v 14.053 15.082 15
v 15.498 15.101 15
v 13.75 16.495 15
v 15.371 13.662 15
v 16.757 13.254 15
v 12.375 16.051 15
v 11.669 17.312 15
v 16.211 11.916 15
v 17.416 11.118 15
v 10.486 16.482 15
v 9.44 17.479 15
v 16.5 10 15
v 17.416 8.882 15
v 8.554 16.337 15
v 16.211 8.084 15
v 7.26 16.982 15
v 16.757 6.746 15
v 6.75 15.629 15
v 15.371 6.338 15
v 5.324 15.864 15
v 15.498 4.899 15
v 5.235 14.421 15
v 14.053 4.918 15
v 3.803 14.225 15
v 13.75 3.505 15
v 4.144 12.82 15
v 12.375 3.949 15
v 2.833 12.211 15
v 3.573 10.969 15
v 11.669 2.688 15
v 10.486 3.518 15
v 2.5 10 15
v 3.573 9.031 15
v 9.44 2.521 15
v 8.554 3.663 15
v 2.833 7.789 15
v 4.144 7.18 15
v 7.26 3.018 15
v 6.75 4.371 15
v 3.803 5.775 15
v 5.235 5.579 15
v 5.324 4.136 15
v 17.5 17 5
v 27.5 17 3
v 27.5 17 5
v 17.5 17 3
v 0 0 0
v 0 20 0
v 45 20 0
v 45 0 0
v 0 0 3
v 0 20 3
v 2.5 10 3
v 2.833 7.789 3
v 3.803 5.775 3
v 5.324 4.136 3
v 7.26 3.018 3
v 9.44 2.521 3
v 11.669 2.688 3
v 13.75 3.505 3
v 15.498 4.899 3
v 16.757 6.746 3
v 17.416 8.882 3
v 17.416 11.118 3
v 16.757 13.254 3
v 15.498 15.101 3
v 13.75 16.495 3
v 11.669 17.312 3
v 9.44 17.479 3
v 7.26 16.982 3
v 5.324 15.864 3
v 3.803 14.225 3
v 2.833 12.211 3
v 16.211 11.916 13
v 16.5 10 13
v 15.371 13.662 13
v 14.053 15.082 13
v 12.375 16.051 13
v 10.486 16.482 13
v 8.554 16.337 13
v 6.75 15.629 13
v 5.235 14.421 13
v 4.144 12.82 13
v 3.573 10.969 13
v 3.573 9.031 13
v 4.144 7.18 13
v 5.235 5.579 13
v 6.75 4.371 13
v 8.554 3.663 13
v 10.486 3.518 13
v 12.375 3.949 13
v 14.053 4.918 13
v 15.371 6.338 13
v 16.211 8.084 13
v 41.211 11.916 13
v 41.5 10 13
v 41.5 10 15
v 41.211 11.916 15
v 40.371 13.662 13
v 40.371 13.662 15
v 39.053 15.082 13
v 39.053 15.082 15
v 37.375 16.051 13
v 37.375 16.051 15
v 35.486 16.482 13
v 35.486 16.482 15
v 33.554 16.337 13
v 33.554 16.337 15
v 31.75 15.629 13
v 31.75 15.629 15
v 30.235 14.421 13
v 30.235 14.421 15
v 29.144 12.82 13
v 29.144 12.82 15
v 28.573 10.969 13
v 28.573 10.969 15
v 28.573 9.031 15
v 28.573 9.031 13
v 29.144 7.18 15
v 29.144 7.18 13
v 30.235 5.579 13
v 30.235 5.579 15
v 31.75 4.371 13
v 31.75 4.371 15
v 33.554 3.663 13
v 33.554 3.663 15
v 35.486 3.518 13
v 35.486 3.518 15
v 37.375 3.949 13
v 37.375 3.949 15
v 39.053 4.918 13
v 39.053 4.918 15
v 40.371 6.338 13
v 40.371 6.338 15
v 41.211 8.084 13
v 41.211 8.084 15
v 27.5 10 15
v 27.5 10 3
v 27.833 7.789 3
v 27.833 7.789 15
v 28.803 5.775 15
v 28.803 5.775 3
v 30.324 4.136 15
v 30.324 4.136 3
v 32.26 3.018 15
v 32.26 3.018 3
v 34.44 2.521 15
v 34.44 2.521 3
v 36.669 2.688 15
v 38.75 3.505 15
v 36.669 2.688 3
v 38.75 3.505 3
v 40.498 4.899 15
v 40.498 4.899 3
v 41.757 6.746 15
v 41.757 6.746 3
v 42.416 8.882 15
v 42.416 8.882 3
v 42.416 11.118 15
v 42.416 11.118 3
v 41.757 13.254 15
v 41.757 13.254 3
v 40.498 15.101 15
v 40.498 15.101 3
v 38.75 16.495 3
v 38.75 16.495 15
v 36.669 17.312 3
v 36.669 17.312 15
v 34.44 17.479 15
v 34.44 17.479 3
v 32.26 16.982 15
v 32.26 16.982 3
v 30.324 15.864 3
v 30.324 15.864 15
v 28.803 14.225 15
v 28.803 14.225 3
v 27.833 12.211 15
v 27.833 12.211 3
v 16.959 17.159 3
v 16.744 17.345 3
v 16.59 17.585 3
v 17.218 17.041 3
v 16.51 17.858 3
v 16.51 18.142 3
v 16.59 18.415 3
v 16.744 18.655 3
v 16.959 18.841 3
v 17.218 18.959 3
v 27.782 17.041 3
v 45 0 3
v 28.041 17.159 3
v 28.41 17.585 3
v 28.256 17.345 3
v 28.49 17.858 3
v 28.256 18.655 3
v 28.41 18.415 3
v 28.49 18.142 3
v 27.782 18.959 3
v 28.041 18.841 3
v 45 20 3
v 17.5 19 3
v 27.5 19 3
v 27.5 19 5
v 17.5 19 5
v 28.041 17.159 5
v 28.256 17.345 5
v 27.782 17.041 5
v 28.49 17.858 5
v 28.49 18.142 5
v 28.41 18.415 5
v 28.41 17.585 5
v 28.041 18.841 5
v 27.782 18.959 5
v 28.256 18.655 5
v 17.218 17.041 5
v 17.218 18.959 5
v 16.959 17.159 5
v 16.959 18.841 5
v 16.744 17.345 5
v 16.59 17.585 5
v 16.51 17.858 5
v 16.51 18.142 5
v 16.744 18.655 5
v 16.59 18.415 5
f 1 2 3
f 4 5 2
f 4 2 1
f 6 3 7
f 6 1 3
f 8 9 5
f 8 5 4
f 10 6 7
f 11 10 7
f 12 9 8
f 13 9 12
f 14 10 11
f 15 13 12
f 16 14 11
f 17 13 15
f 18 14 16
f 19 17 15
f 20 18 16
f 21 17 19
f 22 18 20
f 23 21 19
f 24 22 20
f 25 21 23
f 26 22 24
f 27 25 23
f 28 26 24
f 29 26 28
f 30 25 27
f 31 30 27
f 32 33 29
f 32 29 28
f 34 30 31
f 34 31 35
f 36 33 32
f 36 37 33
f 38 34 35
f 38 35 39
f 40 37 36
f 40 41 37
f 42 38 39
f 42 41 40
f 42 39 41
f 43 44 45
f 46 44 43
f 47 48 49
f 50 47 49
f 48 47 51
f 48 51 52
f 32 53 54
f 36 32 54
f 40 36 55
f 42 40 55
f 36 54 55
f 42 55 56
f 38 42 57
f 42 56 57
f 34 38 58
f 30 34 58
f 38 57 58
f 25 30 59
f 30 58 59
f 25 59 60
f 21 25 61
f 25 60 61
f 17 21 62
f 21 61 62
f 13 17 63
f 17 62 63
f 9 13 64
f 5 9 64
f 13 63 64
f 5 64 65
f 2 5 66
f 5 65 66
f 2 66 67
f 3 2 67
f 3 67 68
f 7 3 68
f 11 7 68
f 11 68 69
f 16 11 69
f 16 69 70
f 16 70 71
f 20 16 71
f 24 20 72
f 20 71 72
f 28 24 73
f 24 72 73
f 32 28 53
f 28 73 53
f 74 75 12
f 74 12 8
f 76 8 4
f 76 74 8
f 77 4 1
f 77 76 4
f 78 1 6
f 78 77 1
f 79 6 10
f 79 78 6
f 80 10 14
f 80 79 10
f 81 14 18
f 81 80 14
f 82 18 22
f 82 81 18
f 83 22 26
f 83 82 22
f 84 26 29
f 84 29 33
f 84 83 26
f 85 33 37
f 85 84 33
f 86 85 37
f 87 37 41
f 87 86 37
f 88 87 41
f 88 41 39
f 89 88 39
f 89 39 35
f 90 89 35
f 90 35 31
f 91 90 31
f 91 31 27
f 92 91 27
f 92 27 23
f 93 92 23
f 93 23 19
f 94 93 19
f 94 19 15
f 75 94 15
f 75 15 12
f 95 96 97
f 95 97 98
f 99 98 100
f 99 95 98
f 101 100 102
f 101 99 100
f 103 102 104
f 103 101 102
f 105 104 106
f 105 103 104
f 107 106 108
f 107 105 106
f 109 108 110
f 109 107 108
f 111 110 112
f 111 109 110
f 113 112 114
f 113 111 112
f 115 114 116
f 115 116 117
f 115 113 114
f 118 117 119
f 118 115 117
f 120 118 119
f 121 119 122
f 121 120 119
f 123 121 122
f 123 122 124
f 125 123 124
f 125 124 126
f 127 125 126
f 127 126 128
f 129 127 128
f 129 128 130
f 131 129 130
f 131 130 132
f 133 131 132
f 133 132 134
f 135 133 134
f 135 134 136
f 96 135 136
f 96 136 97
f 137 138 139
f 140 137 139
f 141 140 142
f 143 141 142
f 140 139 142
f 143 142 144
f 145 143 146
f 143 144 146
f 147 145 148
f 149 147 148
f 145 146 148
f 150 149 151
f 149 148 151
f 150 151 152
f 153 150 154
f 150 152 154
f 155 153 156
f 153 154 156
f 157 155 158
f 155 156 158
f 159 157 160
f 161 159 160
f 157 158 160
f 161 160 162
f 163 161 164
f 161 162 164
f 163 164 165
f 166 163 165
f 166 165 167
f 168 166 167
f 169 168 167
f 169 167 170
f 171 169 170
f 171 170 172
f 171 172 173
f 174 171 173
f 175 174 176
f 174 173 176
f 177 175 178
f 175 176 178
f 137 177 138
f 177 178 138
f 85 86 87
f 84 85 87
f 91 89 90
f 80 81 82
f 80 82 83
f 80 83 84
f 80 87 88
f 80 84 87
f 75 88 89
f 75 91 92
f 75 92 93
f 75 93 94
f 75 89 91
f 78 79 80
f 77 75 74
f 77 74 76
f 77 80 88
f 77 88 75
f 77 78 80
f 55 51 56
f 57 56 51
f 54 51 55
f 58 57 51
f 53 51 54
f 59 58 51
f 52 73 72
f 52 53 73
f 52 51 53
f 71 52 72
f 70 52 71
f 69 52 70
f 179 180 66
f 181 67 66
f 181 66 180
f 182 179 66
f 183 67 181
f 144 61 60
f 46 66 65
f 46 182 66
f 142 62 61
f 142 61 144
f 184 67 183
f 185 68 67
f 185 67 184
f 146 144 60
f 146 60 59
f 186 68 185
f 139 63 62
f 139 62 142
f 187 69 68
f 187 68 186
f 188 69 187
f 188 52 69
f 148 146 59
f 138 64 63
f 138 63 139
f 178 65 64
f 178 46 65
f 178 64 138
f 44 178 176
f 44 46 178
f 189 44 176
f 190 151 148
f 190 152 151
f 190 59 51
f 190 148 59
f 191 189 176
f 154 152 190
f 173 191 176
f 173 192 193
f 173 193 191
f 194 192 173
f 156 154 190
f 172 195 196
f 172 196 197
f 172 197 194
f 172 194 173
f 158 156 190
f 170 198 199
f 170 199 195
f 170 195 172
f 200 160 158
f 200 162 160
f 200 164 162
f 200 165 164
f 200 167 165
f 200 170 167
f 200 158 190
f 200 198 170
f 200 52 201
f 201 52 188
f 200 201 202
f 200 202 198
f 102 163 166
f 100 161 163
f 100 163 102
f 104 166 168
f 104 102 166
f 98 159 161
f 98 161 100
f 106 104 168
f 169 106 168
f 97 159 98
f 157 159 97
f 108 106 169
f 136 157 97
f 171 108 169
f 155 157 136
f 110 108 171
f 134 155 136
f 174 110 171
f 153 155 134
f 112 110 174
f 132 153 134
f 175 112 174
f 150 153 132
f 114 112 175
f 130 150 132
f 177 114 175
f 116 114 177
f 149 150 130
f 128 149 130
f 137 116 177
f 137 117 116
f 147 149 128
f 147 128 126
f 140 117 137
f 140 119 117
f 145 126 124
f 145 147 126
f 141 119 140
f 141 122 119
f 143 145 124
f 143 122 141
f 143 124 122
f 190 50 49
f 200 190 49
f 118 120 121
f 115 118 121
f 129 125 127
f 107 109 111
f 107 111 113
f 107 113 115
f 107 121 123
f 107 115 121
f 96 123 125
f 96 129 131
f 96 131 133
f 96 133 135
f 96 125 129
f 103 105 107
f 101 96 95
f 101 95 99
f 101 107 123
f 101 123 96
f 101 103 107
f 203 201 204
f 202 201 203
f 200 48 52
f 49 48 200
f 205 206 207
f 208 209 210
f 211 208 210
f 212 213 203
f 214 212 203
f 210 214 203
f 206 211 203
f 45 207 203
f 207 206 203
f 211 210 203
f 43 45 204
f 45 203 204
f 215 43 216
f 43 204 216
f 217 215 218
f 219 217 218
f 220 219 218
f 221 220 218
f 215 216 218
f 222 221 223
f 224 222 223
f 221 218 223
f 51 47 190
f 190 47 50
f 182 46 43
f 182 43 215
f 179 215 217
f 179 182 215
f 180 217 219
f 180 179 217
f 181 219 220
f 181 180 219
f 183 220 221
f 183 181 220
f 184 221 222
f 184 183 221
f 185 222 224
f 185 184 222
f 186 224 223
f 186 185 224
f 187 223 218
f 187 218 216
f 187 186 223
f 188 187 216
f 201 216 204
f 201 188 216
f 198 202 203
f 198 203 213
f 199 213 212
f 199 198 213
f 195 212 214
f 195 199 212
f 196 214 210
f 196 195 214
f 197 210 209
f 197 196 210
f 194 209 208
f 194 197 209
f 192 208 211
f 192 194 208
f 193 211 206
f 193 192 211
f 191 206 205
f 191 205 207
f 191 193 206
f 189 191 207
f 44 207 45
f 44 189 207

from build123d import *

# Parameters (mm, degrees)
SKETCH1_W           = 45
SKETCH1_H           = 20
BOSS_EXTRUDE1_DEPTH = 3
SKETCH2_R           = 7.5
SKETCH2_R_2         = 6.5
BOSS_EXTRUDE2_DEPTH = 12
SKETCH2_2_R         = 6.5
BOSS_EXTRUDE3_DEPTH = 10
BOSS_EXTRUDE4_DEPTH = 2


with BuildPart() as part:
    # Sketch1 → Boss-Extrude1 (new body)
    with BuildSketch(Plane.XY):
        with Locations((22.5, 10)):
            Rectangle(SKETCH1_W, SKETCH1_H)
    extrude(amount=BOSS_EXTRUDE1_DEPTH)

    # Sketch2 → Boss-Extrude2 (add)
    # profile 1 of 2: a face of its own
    with BuildSketch(Plane.XY.offset(3)):
        with Locations((10, 10)):
            Circle(SKETCH2_R)
        with Locations((10, 10)):
            Circle(SKETCH2_R_2, mode=Mode.SUBTRACT)
    # profile 2 of 2: a face of its own
    with BuildSketch(Plane.XY.offset(3)):
        with Locations((35, 10)):
            Circle(SKETCH2_R)
        with Locations((35, 10)):
            Circle(SKETCH2_R_2, mode=Mode.SUBTRACT)
    extrude(amount=BOSS_EXTRUDE2_DEPTH)

    # Sketch2<2> → Boss-Extrude3 (add)
    with BuildSketch(Plane.XY.offset(3)):
        with Locations((10, 10)):
            Circle(SKETCH2_2_R)
        with Locations((35, 10)):
            Circle(SKETCH2_2_R)
    extrude(amount=BOSS_EXTRUDE3_DEPTH)

    # Sketch3 → Boss-Extrude4 (add)
    with BuildSketch(Plane.XY.offset(3)):
        with BuildLine():
            Line((17.5, 19), (27.5, 19))
            ThreePointArc((27.5, 19), (28.5, 18), (27.5, 17))
            Line((27.5, 17), (17.5, 17))
            ThreePointArc((17.5, 17), (16.5, 18), (17.5, 19))
        make_face()
    extrude(amount=BOSS_EXTRUDE4_DEPTH)


solid = part.part
